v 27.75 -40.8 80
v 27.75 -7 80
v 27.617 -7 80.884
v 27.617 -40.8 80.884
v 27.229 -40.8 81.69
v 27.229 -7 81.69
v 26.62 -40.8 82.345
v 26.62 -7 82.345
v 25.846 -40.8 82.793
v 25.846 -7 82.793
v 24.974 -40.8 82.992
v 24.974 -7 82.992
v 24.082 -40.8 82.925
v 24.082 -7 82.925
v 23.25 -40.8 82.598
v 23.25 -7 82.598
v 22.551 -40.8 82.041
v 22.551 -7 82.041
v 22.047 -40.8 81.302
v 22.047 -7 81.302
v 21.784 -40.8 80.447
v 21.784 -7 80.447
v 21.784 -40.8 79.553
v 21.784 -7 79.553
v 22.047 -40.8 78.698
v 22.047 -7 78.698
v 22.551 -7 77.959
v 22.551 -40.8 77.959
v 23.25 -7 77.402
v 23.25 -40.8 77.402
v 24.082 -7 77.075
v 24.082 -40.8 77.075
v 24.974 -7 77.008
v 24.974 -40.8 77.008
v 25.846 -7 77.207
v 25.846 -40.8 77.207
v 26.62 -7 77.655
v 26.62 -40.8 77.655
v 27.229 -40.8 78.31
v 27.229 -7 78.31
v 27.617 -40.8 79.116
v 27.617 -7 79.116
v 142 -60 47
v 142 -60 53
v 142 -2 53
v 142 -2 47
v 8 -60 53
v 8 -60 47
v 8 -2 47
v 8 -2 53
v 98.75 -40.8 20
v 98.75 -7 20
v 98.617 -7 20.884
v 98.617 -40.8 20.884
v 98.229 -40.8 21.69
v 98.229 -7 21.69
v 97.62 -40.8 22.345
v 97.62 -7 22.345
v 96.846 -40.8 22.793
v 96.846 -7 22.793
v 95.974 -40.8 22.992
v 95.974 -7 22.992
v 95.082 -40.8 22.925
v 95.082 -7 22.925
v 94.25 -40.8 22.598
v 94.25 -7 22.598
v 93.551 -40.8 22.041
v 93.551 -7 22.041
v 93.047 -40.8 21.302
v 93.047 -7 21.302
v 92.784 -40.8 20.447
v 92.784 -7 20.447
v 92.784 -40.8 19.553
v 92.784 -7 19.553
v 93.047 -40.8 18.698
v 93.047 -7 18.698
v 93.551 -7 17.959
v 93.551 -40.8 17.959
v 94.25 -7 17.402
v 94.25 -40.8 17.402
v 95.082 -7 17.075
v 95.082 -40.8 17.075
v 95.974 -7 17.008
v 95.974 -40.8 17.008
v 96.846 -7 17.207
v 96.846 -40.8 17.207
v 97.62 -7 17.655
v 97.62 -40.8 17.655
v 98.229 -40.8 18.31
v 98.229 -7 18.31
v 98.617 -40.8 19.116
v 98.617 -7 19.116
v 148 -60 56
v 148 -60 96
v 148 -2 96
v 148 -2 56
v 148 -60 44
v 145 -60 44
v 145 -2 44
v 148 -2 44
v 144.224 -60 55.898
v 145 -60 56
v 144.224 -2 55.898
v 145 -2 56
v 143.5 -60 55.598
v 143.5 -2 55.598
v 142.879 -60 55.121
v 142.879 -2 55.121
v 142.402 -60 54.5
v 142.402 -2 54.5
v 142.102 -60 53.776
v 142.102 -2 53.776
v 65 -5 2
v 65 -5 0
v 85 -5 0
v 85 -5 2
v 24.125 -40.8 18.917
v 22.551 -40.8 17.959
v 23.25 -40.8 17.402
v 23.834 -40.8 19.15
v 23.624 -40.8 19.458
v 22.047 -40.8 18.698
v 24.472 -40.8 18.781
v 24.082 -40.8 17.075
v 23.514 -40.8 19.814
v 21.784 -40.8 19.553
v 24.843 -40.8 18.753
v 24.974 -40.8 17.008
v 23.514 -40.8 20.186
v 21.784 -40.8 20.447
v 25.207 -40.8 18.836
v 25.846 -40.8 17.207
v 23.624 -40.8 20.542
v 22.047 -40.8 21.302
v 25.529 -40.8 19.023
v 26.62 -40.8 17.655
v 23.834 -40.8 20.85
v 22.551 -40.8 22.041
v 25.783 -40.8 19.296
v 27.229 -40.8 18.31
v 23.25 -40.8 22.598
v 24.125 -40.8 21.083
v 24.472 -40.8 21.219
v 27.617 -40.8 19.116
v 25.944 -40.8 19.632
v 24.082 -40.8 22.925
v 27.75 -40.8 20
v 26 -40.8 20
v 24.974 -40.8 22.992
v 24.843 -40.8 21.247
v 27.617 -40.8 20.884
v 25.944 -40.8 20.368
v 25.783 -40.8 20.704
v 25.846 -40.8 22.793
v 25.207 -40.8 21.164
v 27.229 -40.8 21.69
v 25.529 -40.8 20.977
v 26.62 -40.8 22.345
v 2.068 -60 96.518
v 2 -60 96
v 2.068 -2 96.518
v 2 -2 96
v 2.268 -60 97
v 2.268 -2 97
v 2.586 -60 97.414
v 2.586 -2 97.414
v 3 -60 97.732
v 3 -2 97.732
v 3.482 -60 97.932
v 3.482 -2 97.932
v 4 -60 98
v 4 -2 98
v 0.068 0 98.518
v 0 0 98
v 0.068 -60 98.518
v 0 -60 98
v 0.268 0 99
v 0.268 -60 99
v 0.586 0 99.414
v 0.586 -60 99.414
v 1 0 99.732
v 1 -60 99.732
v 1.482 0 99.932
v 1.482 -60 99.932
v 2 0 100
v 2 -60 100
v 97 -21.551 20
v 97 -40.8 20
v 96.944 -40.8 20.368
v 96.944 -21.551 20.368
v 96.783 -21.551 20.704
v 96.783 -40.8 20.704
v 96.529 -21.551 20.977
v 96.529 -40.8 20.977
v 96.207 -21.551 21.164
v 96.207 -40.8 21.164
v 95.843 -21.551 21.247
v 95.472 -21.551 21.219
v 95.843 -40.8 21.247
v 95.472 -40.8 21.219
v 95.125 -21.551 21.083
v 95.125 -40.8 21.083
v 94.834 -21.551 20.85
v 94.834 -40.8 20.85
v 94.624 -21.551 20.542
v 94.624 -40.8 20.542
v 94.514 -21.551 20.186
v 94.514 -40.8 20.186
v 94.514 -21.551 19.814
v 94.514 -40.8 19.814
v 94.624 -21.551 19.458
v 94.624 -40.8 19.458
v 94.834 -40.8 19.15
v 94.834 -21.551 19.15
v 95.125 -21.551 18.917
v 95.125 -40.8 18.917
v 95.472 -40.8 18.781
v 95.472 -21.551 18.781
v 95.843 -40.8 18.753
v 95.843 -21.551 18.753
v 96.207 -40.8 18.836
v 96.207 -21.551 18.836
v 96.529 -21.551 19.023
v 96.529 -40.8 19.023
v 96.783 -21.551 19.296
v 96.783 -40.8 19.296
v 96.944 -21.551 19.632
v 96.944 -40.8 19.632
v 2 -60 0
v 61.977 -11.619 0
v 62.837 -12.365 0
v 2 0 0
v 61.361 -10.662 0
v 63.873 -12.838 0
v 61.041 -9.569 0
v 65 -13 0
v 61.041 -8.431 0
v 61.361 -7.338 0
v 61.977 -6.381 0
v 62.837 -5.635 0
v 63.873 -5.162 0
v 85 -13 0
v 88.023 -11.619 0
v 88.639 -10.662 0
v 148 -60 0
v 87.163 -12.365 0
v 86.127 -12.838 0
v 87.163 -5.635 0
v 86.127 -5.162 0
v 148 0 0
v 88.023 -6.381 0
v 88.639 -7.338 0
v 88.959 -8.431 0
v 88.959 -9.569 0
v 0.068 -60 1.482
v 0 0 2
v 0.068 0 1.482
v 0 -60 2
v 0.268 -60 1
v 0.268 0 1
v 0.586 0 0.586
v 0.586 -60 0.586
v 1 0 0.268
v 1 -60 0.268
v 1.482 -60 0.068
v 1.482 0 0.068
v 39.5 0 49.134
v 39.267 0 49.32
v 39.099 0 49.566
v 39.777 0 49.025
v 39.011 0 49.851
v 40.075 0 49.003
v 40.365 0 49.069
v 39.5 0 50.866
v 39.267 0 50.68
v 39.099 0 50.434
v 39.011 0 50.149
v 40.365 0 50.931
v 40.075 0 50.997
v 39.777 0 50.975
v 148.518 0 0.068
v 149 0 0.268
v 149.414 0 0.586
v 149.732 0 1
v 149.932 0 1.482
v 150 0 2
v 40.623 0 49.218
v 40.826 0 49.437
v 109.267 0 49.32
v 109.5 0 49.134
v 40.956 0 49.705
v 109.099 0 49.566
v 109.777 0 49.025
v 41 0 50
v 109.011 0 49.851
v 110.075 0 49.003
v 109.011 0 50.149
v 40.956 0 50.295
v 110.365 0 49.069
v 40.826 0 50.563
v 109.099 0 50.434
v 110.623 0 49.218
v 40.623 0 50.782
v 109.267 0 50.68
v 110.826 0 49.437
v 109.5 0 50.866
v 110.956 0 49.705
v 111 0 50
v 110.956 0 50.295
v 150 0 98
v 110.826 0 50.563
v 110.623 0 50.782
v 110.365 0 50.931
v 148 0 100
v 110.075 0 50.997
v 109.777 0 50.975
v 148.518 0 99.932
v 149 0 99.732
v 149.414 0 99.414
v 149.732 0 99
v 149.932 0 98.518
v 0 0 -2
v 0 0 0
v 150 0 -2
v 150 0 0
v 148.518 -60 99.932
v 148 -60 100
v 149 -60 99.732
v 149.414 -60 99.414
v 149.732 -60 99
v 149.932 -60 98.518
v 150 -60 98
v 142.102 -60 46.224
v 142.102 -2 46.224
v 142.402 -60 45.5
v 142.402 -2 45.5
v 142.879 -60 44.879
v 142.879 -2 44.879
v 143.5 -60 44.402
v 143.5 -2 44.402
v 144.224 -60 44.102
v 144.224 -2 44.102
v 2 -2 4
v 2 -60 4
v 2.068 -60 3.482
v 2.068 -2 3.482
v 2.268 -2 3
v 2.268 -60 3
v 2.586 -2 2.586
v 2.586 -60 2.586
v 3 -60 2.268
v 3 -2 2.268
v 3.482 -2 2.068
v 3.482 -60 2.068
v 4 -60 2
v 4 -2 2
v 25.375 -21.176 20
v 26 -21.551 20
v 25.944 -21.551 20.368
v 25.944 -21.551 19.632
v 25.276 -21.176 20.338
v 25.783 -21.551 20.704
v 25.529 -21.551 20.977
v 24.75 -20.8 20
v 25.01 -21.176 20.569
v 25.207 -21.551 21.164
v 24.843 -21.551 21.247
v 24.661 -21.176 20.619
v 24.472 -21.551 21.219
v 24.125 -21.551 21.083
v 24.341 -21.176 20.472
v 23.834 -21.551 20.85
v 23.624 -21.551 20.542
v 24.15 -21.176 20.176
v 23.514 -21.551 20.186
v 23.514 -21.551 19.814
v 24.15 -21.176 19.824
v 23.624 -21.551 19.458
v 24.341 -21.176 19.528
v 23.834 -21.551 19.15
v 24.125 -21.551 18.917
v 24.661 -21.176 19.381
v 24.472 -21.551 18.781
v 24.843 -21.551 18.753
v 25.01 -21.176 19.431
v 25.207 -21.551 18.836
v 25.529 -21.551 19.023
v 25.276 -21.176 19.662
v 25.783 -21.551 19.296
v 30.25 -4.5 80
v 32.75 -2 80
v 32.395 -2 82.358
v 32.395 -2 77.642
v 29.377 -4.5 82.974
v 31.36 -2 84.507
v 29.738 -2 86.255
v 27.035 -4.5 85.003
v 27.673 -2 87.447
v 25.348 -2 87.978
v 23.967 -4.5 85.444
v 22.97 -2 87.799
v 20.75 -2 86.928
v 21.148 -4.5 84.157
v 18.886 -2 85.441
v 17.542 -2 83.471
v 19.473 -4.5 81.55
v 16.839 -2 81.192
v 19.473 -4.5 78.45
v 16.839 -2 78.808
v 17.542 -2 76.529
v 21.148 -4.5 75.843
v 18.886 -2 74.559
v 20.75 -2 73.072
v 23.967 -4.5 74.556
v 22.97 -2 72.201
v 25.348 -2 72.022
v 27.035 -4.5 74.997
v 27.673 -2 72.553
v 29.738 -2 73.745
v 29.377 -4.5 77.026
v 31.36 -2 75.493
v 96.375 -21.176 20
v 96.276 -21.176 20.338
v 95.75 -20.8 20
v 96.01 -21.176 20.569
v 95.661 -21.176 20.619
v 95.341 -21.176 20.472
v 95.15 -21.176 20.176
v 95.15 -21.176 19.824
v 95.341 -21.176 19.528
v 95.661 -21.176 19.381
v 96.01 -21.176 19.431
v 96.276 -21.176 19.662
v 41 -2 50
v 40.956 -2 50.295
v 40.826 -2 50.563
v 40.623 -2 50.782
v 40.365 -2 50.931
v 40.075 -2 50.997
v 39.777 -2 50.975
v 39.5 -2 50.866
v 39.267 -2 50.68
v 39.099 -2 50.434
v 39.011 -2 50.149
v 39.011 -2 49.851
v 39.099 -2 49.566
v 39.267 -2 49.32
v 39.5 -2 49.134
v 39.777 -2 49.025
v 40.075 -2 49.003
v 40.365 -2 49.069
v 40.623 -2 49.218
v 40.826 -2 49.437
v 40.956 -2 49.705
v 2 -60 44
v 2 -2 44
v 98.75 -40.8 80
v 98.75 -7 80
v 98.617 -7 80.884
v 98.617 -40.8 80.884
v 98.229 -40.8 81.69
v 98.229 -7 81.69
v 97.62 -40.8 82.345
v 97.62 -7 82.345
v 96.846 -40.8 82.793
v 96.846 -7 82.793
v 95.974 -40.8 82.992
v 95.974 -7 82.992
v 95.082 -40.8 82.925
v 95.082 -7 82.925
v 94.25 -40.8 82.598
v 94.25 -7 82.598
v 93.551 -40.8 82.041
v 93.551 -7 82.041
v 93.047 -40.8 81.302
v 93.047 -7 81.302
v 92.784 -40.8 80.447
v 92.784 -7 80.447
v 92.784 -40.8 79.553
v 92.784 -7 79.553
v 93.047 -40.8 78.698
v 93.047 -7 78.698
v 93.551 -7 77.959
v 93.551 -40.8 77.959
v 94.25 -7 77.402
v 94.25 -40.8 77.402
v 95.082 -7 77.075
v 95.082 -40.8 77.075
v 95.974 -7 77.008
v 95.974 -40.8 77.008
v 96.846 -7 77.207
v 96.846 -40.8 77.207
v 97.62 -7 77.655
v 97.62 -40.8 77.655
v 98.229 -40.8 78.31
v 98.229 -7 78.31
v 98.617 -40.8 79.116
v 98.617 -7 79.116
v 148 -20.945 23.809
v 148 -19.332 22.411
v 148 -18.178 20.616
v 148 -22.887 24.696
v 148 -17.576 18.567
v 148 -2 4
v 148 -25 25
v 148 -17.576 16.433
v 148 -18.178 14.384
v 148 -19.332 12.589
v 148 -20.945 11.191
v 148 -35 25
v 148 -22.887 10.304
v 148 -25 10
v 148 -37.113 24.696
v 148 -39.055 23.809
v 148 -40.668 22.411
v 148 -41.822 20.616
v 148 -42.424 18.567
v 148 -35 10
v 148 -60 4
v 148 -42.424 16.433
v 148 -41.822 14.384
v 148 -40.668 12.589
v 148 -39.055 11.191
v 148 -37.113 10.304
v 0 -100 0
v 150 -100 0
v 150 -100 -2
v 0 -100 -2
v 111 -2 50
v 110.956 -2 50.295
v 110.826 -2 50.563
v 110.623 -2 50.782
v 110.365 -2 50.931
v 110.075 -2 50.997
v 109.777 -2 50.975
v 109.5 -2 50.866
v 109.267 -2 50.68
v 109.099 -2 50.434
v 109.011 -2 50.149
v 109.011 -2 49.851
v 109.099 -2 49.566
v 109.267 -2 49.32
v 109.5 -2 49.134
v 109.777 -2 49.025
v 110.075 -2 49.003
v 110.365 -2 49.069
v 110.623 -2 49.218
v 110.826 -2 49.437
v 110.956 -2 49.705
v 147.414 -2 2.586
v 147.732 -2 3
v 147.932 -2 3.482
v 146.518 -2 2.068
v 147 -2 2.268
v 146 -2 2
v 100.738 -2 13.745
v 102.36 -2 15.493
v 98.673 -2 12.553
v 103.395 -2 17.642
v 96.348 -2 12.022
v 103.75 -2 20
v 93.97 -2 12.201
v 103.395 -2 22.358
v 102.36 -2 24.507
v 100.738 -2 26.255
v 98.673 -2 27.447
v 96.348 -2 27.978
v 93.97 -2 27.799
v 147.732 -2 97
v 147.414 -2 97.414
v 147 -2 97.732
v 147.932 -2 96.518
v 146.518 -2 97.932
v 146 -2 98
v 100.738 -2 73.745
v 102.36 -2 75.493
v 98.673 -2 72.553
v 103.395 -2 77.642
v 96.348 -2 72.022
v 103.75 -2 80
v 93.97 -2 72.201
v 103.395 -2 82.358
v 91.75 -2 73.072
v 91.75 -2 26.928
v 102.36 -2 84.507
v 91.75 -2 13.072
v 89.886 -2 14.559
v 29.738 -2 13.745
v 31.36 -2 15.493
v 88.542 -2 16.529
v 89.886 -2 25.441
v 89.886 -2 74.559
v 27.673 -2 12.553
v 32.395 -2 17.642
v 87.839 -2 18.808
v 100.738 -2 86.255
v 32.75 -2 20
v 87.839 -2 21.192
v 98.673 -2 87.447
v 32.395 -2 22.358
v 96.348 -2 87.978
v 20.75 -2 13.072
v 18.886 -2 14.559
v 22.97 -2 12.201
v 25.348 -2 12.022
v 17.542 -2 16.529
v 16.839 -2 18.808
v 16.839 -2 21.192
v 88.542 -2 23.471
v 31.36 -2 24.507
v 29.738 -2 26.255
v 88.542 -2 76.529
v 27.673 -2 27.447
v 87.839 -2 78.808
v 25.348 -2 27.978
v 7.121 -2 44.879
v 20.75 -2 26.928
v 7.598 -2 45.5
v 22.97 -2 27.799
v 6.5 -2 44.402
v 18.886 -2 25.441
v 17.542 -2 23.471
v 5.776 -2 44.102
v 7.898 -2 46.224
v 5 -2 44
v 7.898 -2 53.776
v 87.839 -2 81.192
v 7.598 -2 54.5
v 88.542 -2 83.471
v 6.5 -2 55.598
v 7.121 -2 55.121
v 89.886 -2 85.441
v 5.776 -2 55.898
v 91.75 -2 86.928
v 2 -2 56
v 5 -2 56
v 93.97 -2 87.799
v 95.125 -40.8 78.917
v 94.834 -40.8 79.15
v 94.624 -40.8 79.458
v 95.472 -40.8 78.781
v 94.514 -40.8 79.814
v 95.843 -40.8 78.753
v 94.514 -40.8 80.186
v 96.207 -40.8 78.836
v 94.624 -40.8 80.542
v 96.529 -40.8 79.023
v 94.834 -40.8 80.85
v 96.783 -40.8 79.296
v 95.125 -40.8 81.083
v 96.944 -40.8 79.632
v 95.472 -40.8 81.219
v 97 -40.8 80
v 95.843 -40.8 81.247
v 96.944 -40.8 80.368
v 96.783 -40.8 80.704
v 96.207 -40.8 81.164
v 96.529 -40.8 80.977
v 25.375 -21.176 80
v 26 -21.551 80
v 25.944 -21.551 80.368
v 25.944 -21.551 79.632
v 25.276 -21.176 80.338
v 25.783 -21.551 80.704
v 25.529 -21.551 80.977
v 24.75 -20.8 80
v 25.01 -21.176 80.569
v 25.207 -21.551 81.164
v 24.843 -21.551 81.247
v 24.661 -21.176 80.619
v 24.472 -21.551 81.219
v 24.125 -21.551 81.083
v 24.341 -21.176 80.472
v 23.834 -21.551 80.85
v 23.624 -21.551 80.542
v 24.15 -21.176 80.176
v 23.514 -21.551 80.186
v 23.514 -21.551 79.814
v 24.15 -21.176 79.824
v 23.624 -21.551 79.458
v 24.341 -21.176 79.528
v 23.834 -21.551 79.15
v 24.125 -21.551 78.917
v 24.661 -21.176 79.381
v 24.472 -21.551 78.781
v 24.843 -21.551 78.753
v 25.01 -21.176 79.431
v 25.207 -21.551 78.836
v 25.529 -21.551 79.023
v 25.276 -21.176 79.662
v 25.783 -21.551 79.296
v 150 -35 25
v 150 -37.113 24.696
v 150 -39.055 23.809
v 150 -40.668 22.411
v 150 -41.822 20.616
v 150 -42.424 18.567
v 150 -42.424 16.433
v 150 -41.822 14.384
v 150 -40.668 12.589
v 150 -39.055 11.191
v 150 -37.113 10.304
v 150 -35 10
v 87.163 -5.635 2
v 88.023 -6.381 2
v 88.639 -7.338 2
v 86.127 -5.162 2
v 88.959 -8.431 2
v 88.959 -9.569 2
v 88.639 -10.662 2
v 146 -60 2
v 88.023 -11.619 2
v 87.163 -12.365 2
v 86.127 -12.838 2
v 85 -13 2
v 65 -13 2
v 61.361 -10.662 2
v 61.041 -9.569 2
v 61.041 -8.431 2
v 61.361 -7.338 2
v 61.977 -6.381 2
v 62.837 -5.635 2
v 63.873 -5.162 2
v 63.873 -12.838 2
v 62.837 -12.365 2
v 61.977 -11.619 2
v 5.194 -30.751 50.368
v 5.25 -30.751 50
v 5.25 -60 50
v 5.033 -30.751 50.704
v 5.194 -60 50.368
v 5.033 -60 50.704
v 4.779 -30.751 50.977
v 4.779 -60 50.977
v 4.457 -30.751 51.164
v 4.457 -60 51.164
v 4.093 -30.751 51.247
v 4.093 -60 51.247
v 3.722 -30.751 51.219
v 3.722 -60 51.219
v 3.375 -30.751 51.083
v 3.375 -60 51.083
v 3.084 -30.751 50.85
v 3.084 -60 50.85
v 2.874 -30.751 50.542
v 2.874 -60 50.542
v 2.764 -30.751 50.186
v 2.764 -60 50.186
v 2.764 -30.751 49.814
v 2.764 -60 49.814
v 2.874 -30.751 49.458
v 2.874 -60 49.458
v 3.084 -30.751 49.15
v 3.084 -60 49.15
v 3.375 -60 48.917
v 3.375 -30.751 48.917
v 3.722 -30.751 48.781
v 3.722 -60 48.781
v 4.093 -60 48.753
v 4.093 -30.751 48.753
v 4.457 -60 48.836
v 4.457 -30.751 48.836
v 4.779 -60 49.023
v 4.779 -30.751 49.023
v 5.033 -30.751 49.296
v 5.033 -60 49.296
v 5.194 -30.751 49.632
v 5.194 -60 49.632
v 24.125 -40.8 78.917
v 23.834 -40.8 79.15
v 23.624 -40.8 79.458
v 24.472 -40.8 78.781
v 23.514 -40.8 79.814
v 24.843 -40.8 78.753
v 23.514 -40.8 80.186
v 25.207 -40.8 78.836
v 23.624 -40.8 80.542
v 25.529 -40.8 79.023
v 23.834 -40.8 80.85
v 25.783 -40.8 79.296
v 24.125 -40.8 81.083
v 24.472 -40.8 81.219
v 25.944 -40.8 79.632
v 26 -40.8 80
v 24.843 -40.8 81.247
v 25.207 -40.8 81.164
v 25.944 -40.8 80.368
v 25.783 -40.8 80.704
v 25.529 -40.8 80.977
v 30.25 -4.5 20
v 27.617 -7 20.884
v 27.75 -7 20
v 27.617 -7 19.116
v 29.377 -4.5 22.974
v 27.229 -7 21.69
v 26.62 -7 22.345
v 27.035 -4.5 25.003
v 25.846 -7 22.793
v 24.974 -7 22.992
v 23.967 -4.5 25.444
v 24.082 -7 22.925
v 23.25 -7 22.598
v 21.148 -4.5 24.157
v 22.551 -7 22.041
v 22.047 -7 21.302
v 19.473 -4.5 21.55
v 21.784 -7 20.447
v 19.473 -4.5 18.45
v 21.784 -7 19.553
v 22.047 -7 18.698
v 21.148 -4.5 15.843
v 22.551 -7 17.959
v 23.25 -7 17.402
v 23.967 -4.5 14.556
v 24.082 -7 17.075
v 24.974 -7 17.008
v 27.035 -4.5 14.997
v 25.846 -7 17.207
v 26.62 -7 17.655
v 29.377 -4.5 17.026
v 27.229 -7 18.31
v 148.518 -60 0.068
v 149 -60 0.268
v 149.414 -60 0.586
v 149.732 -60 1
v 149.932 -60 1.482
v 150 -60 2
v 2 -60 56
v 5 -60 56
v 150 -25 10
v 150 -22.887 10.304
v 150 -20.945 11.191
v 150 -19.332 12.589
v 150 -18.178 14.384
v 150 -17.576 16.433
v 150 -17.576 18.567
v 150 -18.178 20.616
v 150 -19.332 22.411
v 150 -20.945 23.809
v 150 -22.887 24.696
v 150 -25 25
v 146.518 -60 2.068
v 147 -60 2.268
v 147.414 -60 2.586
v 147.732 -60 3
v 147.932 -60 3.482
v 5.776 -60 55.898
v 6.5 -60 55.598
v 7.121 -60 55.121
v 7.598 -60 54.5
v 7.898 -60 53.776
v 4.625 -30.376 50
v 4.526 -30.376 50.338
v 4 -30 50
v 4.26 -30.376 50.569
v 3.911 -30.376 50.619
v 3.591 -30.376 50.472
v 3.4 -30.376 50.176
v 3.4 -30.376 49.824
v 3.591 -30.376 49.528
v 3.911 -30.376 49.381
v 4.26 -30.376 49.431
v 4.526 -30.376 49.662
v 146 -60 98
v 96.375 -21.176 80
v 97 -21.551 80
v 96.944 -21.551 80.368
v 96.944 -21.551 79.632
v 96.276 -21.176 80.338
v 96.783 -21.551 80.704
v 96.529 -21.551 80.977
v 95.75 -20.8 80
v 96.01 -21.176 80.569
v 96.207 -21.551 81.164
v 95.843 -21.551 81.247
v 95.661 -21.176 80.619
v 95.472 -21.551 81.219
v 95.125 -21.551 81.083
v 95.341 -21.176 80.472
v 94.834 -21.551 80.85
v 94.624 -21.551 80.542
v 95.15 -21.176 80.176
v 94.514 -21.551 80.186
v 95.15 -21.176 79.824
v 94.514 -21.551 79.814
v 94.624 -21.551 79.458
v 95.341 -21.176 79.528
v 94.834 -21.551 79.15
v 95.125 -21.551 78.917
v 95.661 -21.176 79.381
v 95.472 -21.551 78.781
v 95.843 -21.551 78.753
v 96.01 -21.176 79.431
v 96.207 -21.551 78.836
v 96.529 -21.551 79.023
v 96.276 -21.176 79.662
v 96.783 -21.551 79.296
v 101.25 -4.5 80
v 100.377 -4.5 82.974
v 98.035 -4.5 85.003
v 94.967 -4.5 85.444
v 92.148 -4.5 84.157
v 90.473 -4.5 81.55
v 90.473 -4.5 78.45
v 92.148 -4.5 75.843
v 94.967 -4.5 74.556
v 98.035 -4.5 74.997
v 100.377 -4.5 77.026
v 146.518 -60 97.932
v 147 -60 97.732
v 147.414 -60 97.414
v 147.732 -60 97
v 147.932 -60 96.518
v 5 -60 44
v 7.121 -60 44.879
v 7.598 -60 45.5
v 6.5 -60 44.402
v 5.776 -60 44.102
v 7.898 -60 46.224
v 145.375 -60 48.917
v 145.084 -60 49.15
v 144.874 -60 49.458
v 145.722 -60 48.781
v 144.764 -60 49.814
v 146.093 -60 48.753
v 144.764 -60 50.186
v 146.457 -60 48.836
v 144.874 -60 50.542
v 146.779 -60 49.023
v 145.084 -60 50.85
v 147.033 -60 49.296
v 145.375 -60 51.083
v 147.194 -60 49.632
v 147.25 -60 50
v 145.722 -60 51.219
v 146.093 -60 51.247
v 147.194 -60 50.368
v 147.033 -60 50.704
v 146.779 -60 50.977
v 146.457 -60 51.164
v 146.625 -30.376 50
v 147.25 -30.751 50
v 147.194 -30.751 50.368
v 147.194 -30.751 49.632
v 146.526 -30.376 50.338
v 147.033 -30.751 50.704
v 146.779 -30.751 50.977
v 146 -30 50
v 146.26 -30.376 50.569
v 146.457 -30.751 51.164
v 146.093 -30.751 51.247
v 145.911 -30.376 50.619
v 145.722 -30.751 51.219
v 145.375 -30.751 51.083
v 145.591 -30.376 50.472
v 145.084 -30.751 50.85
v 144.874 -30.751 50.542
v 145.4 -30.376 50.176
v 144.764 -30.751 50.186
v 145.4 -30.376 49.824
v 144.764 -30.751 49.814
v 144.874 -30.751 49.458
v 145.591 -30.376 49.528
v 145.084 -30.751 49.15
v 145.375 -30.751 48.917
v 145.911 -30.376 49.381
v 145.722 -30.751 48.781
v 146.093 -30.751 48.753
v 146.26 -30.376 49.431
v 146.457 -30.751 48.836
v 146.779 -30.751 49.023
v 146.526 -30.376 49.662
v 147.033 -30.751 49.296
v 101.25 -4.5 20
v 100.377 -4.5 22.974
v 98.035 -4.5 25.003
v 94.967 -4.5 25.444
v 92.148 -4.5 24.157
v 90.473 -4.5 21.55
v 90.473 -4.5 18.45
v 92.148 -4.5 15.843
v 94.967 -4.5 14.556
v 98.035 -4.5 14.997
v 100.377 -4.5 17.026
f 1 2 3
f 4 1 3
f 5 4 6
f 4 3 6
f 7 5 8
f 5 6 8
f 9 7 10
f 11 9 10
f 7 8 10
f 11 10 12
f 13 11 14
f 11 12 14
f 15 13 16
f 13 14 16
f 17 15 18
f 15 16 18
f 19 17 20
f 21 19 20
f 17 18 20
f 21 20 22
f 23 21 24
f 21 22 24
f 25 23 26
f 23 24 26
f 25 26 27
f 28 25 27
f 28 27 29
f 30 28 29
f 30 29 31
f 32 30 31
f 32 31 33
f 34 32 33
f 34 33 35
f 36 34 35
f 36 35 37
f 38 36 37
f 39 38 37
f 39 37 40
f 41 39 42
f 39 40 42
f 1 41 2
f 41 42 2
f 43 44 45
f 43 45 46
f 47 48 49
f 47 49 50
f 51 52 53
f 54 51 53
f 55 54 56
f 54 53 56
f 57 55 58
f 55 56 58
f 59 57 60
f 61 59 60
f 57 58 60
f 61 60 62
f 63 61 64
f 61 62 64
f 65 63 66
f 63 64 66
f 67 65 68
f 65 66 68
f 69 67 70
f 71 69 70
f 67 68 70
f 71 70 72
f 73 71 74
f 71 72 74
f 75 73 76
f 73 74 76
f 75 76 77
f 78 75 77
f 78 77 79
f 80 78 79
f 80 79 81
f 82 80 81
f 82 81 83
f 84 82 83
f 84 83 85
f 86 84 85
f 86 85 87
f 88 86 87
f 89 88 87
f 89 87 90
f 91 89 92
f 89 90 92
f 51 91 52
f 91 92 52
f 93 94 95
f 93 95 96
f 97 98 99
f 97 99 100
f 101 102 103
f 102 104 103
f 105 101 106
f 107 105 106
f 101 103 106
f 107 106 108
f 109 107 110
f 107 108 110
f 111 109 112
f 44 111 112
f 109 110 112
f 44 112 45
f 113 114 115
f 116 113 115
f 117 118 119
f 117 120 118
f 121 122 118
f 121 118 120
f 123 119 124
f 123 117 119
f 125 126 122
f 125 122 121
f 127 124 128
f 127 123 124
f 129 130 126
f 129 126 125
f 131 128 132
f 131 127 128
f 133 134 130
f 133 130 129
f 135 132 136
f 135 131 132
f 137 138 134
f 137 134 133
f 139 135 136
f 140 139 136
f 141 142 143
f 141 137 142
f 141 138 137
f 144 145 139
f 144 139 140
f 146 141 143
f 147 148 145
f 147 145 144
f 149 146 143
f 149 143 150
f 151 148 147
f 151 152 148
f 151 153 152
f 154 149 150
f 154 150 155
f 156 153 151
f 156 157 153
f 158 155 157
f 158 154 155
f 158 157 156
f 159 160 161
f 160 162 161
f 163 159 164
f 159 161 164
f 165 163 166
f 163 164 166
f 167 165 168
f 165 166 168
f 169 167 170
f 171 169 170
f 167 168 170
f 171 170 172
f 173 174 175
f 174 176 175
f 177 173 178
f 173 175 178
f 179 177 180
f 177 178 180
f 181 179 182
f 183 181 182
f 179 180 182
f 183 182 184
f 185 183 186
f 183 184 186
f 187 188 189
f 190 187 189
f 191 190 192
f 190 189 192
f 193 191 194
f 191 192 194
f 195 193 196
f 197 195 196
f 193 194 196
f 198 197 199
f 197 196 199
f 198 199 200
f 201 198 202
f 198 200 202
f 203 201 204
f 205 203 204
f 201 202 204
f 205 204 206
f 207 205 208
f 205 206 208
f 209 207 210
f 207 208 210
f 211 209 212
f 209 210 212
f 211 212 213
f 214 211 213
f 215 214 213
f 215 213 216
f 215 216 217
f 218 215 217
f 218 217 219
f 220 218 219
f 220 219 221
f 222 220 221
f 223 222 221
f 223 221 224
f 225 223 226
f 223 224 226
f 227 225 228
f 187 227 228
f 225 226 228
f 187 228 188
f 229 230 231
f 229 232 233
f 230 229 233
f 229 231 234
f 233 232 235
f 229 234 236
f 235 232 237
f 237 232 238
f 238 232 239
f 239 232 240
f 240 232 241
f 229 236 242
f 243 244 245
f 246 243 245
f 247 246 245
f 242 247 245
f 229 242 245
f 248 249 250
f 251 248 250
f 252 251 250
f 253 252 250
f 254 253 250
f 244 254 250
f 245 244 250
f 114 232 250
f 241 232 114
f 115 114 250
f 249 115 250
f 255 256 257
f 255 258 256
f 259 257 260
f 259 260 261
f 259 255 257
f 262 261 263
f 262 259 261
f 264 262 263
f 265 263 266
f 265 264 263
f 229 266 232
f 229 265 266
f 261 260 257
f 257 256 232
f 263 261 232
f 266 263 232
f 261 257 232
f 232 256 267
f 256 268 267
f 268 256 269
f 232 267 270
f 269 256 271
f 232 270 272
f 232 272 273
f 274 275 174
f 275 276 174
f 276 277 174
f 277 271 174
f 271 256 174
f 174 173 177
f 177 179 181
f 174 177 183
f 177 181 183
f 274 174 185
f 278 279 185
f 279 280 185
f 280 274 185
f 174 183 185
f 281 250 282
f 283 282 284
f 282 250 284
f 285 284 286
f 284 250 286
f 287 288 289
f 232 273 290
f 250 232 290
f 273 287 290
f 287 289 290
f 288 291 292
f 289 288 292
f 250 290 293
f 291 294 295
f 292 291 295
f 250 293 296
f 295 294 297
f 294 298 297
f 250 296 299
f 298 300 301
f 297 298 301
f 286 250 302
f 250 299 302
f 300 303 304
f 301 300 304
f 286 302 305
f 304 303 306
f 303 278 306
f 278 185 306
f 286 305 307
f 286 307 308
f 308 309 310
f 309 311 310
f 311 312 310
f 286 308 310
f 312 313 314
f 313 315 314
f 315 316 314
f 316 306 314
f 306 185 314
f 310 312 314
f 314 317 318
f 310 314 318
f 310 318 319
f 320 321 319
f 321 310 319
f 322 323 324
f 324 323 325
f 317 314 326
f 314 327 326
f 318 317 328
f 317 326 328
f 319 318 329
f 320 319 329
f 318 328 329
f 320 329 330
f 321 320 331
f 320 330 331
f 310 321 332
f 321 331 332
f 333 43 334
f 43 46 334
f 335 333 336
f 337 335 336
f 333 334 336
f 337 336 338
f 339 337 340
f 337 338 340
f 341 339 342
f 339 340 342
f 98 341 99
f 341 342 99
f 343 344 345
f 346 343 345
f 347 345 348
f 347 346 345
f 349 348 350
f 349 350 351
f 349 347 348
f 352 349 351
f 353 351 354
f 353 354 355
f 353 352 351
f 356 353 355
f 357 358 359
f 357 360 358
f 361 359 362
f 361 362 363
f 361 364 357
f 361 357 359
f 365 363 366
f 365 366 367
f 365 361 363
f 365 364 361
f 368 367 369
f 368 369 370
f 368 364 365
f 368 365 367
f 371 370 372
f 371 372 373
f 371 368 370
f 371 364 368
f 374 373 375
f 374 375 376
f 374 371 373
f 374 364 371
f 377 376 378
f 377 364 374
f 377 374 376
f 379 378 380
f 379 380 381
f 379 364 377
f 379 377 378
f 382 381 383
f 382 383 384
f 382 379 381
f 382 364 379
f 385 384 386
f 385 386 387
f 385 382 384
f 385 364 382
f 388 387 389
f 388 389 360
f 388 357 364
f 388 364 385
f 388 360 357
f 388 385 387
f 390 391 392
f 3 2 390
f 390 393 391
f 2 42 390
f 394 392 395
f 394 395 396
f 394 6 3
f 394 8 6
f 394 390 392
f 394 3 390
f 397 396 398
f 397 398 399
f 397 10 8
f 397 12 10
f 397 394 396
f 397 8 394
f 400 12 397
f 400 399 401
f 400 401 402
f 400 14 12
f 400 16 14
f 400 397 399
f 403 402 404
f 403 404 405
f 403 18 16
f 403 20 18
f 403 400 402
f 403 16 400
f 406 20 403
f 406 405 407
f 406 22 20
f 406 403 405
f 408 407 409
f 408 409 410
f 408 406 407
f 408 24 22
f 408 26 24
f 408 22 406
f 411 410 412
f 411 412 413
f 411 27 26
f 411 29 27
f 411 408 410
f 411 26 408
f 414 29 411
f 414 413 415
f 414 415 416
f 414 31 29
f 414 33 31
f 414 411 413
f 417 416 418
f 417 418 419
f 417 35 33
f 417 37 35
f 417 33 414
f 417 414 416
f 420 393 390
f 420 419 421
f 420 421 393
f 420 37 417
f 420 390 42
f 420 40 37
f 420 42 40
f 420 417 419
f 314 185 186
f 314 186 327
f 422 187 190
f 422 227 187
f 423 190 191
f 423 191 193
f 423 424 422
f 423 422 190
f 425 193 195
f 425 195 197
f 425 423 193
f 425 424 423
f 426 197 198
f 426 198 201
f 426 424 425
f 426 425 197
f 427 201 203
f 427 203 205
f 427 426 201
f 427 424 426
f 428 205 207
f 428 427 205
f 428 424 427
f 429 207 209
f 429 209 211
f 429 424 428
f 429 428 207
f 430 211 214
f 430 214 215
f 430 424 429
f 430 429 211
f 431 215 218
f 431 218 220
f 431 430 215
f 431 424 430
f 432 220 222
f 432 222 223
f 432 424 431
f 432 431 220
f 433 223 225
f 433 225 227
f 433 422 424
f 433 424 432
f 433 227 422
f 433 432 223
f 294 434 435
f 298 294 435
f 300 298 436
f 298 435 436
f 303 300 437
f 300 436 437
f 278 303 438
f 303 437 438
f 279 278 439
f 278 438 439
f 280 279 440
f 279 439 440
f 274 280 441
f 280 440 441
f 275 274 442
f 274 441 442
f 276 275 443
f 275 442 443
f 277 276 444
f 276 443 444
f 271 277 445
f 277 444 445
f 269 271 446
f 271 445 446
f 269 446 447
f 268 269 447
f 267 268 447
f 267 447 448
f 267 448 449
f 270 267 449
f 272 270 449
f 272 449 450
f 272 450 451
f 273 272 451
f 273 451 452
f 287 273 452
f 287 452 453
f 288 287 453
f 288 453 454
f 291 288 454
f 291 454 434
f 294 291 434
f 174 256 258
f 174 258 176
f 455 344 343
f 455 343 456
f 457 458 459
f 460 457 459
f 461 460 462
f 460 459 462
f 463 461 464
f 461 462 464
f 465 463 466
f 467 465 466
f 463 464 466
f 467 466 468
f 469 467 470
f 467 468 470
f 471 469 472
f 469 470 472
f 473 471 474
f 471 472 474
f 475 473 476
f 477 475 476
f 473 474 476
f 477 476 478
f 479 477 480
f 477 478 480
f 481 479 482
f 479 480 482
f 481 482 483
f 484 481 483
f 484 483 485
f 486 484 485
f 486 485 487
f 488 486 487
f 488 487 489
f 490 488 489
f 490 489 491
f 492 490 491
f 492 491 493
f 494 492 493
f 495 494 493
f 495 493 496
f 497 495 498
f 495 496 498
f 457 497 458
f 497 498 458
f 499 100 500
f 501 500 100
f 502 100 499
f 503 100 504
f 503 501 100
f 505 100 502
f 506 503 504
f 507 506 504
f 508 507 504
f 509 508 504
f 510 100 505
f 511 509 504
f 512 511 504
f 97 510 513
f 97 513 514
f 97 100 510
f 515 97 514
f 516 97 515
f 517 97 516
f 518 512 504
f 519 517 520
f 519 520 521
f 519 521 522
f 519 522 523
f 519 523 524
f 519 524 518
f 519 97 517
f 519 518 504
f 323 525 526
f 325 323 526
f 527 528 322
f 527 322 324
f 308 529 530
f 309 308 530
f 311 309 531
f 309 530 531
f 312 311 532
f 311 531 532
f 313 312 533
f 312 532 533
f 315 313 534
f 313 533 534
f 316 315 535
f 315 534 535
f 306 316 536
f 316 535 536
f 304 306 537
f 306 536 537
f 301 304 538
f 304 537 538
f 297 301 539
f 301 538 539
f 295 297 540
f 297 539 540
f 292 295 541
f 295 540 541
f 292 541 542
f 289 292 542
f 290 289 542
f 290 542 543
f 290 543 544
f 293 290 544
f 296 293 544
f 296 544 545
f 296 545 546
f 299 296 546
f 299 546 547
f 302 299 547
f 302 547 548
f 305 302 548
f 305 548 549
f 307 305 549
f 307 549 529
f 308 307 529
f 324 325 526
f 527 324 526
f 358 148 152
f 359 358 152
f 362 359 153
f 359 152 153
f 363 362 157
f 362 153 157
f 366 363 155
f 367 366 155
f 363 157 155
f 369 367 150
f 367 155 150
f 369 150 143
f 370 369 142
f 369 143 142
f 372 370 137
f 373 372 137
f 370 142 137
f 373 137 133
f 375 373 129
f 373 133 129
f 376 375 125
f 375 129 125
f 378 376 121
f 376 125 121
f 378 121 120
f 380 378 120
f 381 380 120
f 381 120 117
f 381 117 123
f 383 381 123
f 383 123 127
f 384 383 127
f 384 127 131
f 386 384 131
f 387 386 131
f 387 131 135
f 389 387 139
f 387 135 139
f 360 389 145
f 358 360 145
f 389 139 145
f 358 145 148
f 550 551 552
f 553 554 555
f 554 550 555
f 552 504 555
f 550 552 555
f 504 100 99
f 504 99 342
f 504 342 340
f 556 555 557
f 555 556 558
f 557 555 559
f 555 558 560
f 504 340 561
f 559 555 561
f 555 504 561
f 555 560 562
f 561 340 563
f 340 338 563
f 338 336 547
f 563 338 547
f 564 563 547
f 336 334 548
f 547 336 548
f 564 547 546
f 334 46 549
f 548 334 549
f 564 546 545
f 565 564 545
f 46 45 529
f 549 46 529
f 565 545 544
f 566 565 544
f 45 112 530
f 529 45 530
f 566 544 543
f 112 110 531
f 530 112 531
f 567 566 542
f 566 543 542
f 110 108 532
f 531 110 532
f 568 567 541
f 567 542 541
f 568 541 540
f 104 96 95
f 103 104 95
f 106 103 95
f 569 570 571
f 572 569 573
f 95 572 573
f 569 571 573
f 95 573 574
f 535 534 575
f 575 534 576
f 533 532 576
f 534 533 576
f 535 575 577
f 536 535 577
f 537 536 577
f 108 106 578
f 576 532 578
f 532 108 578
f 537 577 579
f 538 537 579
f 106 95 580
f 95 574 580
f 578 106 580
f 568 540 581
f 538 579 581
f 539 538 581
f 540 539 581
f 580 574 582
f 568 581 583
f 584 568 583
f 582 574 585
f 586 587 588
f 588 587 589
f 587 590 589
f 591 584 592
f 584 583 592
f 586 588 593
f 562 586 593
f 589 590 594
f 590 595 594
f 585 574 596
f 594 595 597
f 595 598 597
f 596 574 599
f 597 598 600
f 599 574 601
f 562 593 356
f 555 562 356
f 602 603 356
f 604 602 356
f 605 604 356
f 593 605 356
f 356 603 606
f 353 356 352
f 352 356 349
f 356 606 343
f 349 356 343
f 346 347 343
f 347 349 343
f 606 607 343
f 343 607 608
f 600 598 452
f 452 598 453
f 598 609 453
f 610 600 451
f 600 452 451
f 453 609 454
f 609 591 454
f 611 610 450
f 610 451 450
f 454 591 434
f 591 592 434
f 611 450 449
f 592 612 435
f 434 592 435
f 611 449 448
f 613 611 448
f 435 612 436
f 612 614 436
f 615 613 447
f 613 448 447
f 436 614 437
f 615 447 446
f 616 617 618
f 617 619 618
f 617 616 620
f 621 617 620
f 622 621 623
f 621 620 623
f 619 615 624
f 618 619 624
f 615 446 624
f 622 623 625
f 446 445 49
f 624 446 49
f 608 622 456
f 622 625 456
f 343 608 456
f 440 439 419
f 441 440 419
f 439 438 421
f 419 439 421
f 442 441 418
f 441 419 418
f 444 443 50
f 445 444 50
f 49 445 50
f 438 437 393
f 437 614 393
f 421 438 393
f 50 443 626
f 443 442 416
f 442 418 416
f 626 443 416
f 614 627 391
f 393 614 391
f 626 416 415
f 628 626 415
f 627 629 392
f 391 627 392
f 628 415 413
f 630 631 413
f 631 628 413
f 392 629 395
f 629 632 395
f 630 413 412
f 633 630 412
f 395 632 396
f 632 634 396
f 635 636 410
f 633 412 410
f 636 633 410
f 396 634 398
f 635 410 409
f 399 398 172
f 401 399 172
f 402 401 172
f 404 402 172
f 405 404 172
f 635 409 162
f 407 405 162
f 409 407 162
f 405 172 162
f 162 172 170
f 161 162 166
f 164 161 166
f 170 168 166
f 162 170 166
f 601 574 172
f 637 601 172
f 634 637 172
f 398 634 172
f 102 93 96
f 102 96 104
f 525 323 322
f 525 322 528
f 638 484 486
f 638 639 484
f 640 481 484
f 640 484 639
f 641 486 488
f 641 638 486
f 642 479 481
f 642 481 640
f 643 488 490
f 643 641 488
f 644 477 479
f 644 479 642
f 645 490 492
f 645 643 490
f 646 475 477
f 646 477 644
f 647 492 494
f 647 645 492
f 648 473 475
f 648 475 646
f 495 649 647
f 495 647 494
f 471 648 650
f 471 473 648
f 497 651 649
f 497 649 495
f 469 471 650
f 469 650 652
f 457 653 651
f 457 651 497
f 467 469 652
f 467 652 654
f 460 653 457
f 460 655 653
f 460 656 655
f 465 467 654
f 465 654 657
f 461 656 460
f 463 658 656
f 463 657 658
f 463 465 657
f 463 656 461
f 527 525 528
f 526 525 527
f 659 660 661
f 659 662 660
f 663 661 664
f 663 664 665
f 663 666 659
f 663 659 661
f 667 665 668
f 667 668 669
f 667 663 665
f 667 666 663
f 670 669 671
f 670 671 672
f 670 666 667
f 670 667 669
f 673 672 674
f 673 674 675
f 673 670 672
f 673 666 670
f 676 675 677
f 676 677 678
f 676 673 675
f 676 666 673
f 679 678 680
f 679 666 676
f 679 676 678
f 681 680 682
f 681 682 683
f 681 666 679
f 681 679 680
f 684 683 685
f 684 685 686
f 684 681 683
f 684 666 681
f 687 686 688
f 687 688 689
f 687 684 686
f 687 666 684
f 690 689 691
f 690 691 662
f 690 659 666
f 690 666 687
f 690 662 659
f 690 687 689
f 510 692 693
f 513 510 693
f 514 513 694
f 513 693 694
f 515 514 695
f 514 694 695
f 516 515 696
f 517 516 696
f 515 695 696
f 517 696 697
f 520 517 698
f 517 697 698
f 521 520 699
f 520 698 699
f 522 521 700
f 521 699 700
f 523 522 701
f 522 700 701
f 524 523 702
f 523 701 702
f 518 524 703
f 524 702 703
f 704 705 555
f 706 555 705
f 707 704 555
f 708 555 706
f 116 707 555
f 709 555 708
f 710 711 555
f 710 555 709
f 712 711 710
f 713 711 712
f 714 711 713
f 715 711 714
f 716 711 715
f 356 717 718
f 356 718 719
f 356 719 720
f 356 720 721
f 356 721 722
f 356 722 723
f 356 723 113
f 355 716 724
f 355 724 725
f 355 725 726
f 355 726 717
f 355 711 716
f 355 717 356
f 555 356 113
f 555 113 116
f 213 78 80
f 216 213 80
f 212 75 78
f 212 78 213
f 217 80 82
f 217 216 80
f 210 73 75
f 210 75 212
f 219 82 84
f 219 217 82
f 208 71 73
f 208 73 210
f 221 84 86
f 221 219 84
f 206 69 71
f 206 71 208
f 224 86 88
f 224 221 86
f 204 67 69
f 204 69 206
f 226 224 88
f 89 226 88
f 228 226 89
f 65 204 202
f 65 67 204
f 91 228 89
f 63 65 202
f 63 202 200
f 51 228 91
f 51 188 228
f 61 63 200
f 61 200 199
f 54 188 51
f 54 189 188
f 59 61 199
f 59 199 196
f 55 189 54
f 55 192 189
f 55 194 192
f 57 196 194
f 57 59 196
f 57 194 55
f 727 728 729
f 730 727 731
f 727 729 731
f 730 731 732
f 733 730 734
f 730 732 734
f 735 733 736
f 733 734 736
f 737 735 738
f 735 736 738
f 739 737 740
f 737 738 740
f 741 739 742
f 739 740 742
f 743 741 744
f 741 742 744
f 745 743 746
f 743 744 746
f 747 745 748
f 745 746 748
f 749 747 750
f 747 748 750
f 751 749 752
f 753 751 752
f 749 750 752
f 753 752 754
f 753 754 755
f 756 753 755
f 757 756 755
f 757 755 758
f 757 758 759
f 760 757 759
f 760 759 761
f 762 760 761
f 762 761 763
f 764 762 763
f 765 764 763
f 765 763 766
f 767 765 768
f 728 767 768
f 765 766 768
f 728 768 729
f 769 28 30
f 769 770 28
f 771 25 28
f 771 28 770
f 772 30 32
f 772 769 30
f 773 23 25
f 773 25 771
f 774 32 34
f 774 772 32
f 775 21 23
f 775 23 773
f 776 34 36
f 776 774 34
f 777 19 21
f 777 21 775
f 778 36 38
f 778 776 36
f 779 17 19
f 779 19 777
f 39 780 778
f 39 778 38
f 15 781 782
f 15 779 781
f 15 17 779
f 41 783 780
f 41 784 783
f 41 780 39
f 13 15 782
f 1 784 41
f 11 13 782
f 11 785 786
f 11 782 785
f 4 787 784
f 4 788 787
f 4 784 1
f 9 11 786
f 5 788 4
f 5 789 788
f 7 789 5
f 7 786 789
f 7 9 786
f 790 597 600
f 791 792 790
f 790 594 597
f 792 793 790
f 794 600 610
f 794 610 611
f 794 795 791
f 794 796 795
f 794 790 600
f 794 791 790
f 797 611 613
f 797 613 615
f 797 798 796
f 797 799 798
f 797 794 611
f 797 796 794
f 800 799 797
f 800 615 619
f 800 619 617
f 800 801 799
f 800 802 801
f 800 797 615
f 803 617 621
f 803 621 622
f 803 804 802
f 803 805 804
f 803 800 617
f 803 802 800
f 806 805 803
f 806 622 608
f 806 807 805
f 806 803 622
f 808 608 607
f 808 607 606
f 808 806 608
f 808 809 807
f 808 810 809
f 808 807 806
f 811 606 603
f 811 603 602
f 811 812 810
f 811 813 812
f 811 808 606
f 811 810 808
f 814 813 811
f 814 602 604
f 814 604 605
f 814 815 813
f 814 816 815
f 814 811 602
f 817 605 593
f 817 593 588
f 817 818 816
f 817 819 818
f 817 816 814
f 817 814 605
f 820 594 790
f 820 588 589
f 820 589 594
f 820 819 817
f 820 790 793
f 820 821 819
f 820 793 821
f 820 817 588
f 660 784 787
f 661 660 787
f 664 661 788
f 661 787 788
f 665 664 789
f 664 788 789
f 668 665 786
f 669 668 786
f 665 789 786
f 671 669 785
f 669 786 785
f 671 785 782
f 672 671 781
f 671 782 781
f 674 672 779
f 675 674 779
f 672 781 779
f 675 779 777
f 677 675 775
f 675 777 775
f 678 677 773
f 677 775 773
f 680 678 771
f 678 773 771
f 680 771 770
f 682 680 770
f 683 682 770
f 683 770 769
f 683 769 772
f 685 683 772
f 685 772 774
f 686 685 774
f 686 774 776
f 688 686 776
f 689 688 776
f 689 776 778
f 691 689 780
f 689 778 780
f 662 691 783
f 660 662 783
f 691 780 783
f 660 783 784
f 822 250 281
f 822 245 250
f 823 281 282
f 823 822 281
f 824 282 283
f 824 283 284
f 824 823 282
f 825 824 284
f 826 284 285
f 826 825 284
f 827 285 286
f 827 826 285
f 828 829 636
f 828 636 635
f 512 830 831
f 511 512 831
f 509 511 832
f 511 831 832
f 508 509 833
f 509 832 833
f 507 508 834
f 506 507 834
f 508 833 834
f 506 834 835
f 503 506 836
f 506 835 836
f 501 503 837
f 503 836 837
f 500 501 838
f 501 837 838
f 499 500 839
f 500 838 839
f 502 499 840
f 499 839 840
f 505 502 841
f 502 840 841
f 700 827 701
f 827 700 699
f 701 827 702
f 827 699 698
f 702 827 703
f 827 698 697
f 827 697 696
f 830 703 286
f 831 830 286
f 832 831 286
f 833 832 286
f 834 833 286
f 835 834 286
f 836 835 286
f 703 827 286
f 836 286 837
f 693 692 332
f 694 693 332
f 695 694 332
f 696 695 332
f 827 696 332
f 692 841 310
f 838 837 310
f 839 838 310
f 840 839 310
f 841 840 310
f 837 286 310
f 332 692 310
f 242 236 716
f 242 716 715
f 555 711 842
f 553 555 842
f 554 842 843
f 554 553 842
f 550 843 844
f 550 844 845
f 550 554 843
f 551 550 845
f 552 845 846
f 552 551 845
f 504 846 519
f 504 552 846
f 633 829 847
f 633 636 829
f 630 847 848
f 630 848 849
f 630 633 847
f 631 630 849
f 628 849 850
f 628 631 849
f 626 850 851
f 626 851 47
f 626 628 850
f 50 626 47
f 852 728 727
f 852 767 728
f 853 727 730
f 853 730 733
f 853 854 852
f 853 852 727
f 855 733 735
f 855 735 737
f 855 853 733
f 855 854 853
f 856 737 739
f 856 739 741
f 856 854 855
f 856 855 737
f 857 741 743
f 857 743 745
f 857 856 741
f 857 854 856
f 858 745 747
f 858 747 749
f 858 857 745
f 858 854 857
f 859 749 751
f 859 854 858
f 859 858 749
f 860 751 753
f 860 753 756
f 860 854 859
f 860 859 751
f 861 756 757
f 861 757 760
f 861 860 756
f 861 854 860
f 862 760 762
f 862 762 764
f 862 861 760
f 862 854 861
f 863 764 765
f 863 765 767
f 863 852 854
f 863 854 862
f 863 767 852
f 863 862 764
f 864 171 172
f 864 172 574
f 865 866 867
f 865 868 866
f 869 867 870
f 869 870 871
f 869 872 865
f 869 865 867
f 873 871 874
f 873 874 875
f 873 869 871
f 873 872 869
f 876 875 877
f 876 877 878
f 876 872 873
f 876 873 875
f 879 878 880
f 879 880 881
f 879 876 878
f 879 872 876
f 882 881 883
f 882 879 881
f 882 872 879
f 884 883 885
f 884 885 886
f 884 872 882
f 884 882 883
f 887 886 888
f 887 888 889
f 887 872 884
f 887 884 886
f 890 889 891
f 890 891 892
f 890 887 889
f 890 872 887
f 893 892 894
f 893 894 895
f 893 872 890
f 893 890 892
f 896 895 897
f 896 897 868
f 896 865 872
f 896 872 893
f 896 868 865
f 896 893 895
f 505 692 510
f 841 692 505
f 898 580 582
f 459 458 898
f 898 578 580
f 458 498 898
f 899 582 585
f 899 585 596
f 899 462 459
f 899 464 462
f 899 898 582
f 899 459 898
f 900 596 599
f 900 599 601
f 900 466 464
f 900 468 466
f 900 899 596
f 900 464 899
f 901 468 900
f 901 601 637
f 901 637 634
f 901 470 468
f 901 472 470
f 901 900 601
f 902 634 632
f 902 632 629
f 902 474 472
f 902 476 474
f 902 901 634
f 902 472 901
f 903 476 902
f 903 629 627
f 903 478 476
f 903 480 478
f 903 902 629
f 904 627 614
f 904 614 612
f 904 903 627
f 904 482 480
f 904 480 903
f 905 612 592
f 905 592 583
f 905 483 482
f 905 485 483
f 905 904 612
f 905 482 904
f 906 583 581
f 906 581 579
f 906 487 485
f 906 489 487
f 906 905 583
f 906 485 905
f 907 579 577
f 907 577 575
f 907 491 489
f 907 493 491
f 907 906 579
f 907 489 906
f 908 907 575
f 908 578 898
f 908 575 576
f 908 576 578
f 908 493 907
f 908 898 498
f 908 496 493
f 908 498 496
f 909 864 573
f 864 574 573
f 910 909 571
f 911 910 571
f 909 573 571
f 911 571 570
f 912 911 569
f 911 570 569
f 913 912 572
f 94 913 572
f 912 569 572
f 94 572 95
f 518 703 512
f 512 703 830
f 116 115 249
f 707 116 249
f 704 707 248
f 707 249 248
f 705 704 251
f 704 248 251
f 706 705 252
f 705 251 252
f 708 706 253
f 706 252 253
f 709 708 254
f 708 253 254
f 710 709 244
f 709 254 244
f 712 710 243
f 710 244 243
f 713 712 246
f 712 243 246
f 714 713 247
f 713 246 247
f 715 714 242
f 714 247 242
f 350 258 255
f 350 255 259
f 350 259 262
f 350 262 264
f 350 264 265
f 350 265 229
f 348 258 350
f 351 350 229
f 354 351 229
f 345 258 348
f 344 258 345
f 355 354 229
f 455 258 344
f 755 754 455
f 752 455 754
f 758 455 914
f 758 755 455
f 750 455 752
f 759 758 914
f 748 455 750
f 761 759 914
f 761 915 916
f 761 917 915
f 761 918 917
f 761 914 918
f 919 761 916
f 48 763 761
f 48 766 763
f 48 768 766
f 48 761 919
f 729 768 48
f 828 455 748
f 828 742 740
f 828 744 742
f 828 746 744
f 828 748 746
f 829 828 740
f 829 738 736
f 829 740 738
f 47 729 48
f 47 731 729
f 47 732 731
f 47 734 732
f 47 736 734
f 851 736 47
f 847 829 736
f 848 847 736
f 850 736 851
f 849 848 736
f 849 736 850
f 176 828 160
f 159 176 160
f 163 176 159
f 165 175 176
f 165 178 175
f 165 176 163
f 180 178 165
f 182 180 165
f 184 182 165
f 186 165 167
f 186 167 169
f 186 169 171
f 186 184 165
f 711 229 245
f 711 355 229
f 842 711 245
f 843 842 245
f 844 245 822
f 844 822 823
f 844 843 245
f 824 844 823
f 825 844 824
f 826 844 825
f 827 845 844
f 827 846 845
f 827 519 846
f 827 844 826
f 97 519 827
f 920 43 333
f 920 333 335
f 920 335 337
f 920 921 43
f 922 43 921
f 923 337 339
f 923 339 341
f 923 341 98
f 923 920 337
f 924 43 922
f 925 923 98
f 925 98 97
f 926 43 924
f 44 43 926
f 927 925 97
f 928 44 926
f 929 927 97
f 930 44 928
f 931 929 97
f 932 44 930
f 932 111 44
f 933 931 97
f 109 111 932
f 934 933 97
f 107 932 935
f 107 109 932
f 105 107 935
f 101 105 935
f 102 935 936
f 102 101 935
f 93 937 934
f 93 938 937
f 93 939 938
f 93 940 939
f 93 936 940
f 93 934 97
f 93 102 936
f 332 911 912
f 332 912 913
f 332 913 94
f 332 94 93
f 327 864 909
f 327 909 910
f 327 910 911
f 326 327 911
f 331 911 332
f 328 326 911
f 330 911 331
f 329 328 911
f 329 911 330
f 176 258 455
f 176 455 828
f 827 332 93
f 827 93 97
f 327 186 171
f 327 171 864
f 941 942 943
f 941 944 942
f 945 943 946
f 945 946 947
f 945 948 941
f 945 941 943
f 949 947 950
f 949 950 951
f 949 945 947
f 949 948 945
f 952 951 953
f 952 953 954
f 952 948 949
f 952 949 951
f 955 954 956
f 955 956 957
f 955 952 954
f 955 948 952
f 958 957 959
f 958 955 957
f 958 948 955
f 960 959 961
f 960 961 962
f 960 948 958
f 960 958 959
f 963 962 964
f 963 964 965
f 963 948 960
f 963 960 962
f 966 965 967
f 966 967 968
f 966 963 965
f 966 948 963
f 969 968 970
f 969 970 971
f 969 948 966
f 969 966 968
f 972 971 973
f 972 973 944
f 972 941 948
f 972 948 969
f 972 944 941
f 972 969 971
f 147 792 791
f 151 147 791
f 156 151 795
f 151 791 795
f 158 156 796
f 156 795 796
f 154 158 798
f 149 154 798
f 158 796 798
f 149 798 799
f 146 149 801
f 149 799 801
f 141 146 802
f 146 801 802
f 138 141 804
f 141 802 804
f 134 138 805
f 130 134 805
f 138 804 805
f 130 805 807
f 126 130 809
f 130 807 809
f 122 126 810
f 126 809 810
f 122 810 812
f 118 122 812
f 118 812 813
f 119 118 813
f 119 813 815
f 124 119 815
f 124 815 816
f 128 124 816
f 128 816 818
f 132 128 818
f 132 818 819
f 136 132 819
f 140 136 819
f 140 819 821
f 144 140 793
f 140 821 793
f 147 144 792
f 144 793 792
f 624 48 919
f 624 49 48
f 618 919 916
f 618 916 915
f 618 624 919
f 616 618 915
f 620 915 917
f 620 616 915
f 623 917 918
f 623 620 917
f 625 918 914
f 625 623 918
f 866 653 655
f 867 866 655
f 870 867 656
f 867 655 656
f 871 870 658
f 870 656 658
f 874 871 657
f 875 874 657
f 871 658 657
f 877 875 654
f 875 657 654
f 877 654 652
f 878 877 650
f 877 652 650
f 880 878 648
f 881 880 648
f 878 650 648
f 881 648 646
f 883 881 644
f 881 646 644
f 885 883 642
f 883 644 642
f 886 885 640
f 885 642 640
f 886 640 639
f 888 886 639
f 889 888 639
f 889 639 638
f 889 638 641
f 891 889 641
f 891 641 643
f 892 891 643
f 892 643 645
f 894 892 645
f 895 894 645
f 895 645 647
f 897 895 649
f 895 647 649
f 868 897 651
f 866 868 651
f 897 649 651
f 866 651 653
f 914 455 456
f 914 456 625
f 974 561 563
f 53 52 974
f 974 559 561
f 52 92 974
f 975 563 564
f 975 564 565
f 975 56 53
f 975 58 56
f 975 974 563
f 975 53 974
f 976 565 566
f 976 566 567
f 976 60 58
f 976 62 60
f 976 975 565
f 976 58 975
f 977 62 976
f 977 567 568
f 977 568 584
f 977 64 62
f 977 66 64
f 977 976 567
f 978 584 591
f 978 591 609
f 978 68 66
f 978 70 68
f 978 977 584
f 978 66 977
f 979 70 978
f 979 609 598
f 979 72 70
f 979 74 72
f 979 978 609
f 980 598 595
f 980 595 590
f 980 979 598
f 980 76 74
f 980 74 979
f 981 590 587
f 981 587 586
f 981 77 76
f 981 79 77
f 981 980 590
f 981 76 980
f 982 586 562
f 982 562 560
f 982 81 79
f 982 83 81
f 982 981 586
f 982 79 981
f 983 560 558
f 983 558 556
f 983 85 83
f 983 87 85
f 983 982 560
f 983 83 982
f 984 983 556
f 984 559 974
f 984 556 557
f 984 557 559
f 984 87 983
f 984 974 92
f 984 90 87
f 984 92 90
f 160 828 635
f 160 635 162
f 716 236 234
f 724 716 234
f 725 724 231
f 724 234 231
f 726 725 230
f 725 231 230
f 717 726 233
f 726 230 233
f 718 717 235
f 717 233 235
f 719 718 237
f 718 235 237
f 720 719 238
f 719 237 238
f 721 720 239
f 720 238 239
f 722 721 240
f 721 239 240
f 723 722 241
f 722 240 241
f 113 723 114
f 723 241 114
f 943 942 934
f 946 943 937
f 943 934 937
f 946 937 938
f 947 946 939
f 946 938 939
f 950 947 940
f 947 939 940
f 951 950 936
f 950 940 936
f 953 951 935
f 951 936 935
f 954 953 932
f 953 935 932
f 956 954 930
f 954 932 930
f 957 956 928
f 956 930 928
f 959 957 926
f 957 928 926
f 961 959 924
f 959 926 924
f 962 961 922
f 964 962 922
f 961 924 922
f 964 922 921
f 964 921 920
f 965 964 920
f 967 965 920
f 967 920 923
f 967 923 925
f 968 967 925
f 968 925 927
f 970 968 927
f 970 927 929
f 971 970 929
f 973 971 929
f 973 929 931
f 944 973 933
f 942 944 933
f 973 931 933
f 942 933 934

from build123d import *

# Parameters (mm, degrees)
SKETCH_W        = 150
SKETCH_H        = 100
PAD_DEPTH       = 60
POCKET_DEPTH    = 58
SKETCH002_R     = 3
PAD001_DEPTH    = 38.8
SKETCH003_R     = 1.25
HOLE_DEPTH      = 19.248924
HOLE_TIPS_R     = 1.25
SKETCH004_R     = 1.25
HOLE001_DEPTH   = 29.248924
HOLE001_TIPS_R  = 1.25
POCKET001_DEPTH = 2
POCKET002_DEPTH = 2
FILLET002_R     = 2
FILLET_R        = 2
FILLET003_R     = 3
SKETCH007_R     = 1
POCKET003_DEPTH = 40.801
CHAMFER_SIZE    = 5
SKETCH008_W     = 150
SKETCH008_H     = 100
PAD002_DEPTH    = 2


with BuildPart() as box:
    # Sketch → Pad (new body)
    with BuildSketch(Plane.XZ):
        with Locations((75, 50)):
            Rectangle(SKETCH_W, SKETCH_H)
    extrude(amount=PAD_DEPTH)

    # Sketch001 (on Face6 of Pad) → Pocket (cut)
    with BuildSketch(Plane.XZ.offset(60)):
        Polygon((2, 98), (148, 98), (148, 56), (142, 56), (142, 44), (148, 44), (148, 2), (2, 2), (2, 44), (8, 44), (8, 56), (2, 56), align=None)
    extrude(amount=-POCKET_DEPTH, mode=Mode.SUBTRACT)

    # Sketch002 (on Face19 of Pocket) → Pad001 (join)
    with BuildSketch(Plane.XZ.offset(2)):
        with Locations((24.75, 80)):
            Circle(SKETCH002_R)
        with Locations((95.75, 80)):
            Circle(SKETCH002_R)
        with Locations((24.75, 20)):
            Circle(SKETCH002_R)
        with Locations((95.75, 20)):
            Circle(SKETCH002_R)
    extrude(amount=PAD001_DEPTH)

    # Sketch003 (on Face25 of Pad001) → Hole (cut)
    with BuildSketch(Plane.XZ.offset(40.8)):
        with Locations((24.75, 80)):
            Circle(SKETCH003_R)
        with Locations((95.75, 80)):
            Circle(SKETCH003_R)
        with Locations((95.75, 20)):
            Circle(SKETCH003_R)
        with Locations((24.75, 20)):
            Circle(SKETCH003_R)
    extrude(amount=-HOLE_DEPTH, mode=Mode.SUBTRACT)

    # Hole tips → Hole tip 1 section 0
    with BuildSketch(Plane.XZ.offset(21.551076), mode=Mode.PRIVATE) as hole_tip_1_s0:
        with Locations((24.75, 80)):
            Circle(HOLE_TIPS_R)
    loft([hole_tip_1_s0.sketch, Vertex(24.75, -20.8, 80)], mode=Mode.SUBTRACT)

    # Hole tips → Hole tip 2 section 0
    with BuildSketch(Plane.XZ.offset(21.551076), mode=Mode.PRIVATE) as hole_tip_2_s0:
        with Locations((95.75, 80)):
            Circle(HOLE_TIPS_R)
    loft([hole_tip_2_s0.sketch, Vertex(95.75, -20.8, 80)], mode=Mode.SUBTRACT)

    # Hole tips → Hole tip 3 section 0
    with BuildSketch(Plane.XZ.offset(21.551076), mode=Mode.PRIVATE) as hole_tip_3_s0:
        with Locations((95.75, 20)):
            Circle(HOLE_TIPS_R)
    loft([hole_tip_3_s0.sketch, Vertex(95.75, -20.8, 20)], mode=Mode.SUBTRACT)

    # Hole tips → Hole tip 4 section 0
    with BuildSketch(Plane.XZ.offset(21.551076), mode=Mode.PRIVATE) as hole_tip_4_s0:
        with Locations((24.75, 20)):
            Circle(HOLE_TIPS_R)
    loft([hole_tip_4_s0.sketch, Vertex(24.75, -20.8, 20)], mode=Mode.SUBTRACT)

    # Sketch004 (on Face5 of Hole) → Hole001 (cut)
    with BuildSketch(Plane.XZ.offset(60)):
        with Locations((146, 50)):
            Circle(SKETCH004_R)
        with Locations((4, 50)):
            Circle(SKETCH004_R)
    extrude(amount=-HOLE001_DEPTH, mode=Mode.SUBTRACT)

    # Hole001 tips → Hole001 tip 1 section 0
    with BuildSketch(Plane.XZ.offset(30.751076), mode=Mode.PRIVATE) as hole001_tip_1_s0:
        with Locations((146, 50)):
            Circle(HOLE001_TIPS_R)
    loft([hole001_tip_1_s0.sketch, Vertex(146, -30, 50)], mode=Mode.SUBTRACT)

    # Hole001 tips → Hole001 tip 2 section 0
    with BuildSketch(Plane.XZ.offset(30.751076), mode=Mode.PRIVATE) as hole001_tip_2_s0:
        with Locations((4, 50)):
            Circle(HOLE001_TIPS_R)
    loft([hole001_tip_2_s0.sketch, Vertex(4, -30, 50)], mode=Mode.SUBTRACT)

    # Sketch005 (on Face1 of Hole001) → Pocket001 (cut)
    with BuildSketch(Plane(origin=(0, 0, 0), x_dir=(1, 0, 0), z_dir=(0, 0, -1))):
        with BuildLine():
            ThreePointArc((65, 13), (61, 9), (65, 5))
            Line((65, 5), (85, 5))
            ThreePointArc((85, 5), (89, 9), (85, 13))
            Line((65, 13), (85, 13))
        make_face()
    extrude(amount=-POCKET001_DEPTH, mode=Mode.SUBTRACT)

    # Sketch006 (on Face5 of Pocket001) → Pocket002 (cut)
    with BuildSketch(Plane(origin=(150, 0, 0), x_dir=(0, 0, 1), z_dir=(1, 0, 0))):
        with BuildLine():
            ThreePointArc((25, 35), (17.5, 42.5), (10, 35))
            Line((10, 35), (10, 25))
            ThreePointArc((10, 25), (17.5, 17.5), (25, 25))
            Line((25, 35), (25, 25))
        make_face()
    extrude(amount=-POCKET002_DEPTH, mode=Mode.SUBTRACT)

    # Fillet002
    fillet002_edges = [box.edges().sort_by_distance(p)[0] for p in [
        (150, -30, 100),
        (150, -30, 0),
        (0, -30, 100),
        (0, -30, 0),
    ]]
    fillet(fillet002_edges, radius=FILLET002_R)

    # Fillet
    fillet_edges = [box.edges().sort_by_distance(p)[0] for p in [
        (148, -31, 2),
        (148, -31, 98),
        (2, -31, 2),
        (2, -31, 98),
    ]]
    fillet(fillet_edges, radius=FILLET_R)

    # Fillet003
    fillet003_edges = [box.edges().sort_by_distance(p)[0] for p in [
        (8, -31, 44),
        (8, -31, 56),
        (142, -31, 56),
        (142, -31, 44),
    ]]
    fillet(fillet003_edges, radius=FILLET003_R)

    # Sketch007 (on Face38 of Pocket002) → Pocket003 (cut, through all)
    with BuildSketch(Plane.XZ.offset(40.8)):
        with Locations((40, 50)):
            Circle(SKETCH007_R)
        with Locations((110, 50)):
            Circle(SKETCH007_R)
    extrude(amount=-POCKET003_DEPTH, mode=Mode.SUBTRACT)

    # Chamfer
    chamfer_edges = [box.edges().sort_by_distance(p)[0] for p in [
        (21.75, -2, 20),
        (21.75, -2, 80),
        (92.75, -2, 80),
        (92.75, -2, 20),
    ]]
    chamfer(chamfer_edges, length=CHAMFER_SIZE)


with BuildPart() as coperchio:
    # Sketch008 (on ShapeBinder) → Pad002 (new body)
    with BuildSketch(Plane(origin=(0, 0, 0), x_dir=(1, 0, 0), z_dir=(0, 0, -1))):
        with Locations((75, 50)):
            Rectangle(SKETCH008_W, SKETCH008_H)
    extrude(amount=PAD002_DEPTH)


solid = Compound([box.part, coperchio.part])
